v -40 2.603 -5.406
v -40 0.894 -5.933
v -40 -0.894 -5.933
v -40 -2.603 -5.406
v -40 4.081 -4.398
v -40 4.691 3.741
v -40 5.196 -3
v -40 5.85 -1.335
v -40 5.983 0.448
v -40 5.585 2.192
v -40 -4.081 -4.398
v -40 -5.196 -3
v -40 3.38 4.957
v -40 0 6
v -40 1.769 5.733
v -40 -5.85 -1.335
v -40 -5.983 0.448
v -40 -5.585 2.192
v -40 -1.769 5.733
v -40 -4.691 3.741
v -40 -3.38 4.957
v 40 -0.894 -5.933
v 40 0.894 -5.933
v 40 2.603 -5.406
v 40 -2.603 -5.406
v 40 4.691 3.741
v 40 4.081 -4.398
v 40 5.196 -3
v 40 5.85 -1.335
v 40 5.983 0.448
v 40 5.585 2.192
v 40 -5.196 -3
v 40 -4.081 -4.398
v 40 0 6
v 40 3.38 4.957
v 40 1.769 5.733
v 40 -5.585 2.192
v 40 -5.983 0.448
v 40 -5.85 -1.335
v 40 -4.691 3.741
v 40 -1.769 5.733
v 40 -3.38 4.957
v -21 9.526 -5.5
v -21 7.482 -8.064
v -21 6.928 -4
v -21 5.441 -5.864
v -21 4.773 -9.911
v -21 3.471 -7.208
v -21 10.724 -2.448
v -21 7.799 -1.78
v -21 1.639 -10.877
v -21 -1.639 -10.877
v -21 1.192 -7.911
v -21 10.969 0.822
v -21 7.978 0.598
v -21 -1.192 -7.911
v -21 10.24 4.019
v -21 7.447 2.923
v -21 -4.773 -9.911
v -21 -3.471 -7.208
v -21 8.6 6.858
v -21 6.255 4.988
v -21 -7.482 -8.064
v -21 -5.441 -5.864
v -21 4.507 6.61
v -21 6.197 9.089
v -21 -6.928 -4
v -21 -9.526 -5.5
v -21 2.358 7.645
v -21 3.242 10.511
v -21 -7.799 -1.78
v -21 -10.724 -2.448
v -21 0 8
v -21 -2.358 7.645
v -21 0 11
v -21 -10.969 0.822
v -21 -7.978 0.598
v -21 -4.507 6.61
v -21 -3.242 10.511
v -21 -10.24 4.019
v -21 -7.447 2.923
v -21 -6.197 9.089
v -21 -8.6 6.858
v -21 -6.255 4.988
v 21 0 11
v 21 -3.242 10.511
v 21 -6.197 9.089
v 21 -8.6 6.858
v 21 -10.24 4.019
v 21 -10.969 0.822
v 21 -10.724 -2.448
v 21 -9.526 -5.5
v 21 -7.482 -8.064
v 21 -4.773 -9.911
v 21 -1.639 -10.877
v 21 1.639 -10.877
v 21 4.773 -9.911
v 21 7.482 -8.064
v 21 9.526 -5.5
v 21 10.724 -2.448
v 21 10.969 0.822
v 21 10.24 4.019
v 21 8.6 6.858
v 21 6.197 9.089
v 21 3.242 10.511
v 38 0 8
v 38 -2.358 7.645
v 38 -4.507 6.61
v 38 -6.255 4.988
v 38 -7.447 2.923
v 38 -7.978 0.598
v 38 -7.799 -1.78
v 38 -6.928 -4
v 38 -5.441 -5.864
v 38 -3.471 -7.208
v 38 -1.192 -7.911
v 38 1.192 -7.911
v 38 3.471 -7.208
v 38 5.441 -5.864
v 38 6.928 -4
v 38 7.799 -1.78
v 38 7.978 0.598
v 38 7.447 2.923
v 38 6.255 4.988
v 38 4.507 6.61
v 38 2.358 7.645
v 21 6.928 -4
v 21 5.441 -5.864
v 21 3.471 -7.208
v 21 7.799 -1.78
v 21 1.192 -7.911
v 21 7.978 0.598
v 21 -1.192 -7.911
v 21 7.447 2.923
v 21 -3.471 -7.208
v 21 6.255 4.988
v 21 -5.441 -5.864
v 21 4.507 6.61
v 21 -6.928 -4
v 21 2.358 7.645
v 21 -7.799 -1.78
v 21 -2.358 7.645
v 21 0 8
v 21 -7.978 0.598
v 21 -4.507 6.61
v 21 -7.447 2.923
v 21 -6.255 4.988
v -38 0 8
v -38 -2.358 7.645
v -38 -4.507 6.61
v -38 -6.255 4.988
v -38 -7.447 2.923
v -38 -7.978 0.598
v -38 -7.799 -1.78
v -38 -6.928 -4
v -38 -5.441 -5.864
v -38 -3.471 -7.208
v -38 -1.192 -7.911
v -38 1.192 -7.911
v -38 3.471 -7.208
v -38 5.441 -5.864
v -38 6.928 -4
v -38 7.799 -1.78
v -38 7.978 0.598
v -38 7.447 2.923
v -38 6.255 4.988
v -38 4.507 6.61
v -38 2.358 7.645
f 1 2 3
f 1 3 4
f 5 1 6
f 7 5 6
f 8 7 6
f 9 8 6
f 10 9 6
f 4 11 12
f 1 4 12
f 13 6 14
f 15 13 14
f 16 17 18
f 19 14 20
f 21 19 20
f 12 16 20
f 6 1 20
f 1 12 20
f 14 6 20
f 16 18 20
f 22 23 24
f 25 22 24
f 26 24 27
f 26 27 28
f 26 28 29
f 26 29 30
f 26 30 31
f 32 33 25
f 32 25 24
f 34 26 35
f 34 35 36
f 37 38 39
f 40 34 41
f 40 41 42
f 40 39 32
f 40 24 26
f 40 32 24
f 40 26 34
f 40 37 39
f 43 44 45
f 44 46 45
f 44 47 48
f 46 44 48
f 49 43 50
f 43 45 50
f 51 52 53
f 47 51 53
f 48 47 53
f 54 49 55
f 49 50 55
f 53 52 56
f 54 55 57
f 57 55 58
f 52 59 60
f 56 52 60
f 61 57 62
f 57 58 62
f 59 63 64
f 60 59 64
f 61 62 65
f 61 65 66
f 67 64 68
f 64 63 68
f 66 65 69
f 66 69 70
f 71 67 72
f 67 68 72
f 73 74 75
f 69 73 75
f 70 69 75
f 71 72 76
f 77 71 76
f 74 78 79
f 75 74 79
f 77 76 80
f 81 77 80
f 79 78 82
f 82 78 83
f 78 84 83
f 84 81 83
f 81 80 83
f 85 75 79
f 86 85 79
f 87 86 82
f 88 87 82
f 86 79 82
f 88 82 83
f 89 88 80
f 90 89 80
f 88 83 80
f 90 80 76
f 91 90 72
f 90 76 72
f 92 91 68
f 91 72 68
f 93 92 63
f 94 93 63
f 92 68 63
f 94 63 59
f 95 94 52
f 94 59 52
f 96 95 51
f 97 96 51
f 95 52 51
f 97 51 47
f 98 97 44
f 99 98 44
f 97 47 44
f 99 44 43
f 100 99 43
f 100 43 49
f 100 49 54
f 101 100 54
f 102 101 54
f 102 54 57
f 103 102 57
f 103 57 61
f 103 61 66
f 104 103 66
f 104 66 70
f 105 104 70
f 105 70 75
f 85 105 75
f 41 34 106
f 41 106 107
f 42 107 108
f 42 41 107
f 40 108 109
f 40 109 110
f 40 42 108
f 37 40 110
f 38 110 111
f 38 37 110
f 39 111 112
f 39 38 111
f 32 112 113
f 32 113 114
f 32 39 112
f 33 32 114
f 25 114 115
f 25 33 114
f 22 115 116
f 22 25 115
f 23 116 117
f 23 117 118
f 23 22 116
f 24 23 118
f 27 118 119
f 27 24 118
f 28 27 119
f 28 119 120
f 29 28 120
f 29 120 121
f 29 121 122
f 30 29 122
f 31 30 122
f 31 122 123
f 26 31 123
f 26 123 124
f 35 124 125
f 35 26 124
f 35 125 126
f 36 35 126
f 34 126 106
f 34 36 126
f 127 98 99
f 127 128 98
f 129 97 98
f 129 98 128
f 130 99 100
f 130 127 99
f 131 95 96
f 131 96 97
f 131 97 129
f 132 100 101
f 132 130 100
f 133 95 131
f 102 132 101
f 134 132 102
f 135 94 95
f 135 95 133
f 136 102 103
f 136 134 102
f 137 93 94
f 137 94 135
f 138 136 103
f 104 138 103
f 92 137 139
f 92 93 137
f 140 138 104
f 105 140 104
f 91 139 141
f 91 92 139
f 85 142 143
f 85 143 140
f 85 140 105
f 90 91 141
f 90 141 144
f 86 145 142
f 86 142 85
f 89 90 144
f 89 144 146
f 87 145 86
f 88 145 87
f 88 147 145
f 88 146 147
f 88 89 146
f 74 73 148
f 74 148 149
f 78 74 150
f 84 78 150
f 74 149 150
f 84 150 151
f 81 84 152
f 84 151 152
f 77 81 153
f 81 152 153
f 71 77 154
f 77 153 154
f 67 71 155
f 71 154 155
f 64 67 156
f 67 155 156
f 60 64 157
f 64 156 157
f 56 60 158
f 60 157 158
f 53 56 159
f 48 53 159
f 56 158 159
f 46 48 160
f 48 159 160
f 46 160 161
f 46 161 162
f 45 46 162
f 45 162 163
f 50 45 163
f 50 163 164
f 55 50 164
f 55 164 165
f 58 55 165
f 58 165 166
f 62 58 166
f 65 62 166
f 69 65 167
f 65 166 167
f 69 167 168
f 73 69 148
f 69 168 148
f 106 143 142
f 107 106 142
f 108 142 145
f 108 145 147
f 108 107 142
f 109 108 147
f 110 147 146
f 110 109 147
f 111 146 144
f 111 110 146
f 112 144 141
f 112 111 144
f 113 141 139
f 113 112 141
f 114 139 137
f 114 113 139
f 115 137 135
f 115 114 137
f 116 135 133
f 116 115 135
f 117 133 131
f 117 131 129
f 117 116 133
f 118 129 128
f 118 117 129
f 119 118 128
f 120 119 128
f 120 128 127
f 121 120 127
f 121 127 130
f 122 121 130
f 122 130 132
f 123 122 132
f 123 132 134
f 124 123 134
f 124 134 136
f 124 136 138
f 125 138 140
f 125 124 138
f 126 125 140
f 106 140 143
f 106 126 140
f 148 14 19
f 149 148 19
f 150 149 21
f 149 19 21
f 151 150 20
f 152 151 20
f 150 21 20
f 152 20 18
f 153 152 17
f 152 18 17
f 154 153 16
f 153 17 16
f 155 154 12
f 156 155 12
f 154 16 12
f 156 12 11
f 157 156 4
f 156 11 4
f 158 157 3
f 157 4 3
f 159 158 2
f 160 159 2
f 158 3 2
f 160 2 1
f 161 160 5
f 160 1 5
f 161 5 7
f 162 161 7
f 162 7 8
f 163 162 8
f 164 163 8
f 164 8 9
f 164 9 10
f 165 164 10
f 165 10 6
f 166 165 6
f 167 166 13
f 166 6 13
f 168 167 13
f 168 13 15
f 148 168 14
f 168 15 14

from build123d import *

# Parameters (mm, degrees)
CHAMFER_1_SIZE = 2


with BuildPart() as part:
    # 草圖1 → 旋轉1 (revolve)
    with BuildSketch(Plane.XY, mode=Mode.PRIVATE) as revolve_1_sk:
        Polygon((0, 0), (0, 11), (21, 11), (21, 8), (40, 8), (40, 0), align=None)
    revolve(revolve_1_sk.sketch.rotate(Axis((0, 0, 0), (1, 0, 0)), 90), axis=Axis((0, 0, 0), (1, 0, 0)))

    # 導角1
    chamfer_1_edges = [part.edges().sort_by_distance(p)[0] for p in [
        (40, 0, -8),
    ]]
    chamfer(chamfer_1_edges, length=CHAMFER_1_SIZE)

    # 鏡射1: part across plane


with BuildPart() as part_1:
    add(part.part)
    add(part.part.mirror(Plane(origin=(0, 0, 0), x_dir=(0, 0, 1), z_dir=(1, 0, 0))))


solid = part_1.part
